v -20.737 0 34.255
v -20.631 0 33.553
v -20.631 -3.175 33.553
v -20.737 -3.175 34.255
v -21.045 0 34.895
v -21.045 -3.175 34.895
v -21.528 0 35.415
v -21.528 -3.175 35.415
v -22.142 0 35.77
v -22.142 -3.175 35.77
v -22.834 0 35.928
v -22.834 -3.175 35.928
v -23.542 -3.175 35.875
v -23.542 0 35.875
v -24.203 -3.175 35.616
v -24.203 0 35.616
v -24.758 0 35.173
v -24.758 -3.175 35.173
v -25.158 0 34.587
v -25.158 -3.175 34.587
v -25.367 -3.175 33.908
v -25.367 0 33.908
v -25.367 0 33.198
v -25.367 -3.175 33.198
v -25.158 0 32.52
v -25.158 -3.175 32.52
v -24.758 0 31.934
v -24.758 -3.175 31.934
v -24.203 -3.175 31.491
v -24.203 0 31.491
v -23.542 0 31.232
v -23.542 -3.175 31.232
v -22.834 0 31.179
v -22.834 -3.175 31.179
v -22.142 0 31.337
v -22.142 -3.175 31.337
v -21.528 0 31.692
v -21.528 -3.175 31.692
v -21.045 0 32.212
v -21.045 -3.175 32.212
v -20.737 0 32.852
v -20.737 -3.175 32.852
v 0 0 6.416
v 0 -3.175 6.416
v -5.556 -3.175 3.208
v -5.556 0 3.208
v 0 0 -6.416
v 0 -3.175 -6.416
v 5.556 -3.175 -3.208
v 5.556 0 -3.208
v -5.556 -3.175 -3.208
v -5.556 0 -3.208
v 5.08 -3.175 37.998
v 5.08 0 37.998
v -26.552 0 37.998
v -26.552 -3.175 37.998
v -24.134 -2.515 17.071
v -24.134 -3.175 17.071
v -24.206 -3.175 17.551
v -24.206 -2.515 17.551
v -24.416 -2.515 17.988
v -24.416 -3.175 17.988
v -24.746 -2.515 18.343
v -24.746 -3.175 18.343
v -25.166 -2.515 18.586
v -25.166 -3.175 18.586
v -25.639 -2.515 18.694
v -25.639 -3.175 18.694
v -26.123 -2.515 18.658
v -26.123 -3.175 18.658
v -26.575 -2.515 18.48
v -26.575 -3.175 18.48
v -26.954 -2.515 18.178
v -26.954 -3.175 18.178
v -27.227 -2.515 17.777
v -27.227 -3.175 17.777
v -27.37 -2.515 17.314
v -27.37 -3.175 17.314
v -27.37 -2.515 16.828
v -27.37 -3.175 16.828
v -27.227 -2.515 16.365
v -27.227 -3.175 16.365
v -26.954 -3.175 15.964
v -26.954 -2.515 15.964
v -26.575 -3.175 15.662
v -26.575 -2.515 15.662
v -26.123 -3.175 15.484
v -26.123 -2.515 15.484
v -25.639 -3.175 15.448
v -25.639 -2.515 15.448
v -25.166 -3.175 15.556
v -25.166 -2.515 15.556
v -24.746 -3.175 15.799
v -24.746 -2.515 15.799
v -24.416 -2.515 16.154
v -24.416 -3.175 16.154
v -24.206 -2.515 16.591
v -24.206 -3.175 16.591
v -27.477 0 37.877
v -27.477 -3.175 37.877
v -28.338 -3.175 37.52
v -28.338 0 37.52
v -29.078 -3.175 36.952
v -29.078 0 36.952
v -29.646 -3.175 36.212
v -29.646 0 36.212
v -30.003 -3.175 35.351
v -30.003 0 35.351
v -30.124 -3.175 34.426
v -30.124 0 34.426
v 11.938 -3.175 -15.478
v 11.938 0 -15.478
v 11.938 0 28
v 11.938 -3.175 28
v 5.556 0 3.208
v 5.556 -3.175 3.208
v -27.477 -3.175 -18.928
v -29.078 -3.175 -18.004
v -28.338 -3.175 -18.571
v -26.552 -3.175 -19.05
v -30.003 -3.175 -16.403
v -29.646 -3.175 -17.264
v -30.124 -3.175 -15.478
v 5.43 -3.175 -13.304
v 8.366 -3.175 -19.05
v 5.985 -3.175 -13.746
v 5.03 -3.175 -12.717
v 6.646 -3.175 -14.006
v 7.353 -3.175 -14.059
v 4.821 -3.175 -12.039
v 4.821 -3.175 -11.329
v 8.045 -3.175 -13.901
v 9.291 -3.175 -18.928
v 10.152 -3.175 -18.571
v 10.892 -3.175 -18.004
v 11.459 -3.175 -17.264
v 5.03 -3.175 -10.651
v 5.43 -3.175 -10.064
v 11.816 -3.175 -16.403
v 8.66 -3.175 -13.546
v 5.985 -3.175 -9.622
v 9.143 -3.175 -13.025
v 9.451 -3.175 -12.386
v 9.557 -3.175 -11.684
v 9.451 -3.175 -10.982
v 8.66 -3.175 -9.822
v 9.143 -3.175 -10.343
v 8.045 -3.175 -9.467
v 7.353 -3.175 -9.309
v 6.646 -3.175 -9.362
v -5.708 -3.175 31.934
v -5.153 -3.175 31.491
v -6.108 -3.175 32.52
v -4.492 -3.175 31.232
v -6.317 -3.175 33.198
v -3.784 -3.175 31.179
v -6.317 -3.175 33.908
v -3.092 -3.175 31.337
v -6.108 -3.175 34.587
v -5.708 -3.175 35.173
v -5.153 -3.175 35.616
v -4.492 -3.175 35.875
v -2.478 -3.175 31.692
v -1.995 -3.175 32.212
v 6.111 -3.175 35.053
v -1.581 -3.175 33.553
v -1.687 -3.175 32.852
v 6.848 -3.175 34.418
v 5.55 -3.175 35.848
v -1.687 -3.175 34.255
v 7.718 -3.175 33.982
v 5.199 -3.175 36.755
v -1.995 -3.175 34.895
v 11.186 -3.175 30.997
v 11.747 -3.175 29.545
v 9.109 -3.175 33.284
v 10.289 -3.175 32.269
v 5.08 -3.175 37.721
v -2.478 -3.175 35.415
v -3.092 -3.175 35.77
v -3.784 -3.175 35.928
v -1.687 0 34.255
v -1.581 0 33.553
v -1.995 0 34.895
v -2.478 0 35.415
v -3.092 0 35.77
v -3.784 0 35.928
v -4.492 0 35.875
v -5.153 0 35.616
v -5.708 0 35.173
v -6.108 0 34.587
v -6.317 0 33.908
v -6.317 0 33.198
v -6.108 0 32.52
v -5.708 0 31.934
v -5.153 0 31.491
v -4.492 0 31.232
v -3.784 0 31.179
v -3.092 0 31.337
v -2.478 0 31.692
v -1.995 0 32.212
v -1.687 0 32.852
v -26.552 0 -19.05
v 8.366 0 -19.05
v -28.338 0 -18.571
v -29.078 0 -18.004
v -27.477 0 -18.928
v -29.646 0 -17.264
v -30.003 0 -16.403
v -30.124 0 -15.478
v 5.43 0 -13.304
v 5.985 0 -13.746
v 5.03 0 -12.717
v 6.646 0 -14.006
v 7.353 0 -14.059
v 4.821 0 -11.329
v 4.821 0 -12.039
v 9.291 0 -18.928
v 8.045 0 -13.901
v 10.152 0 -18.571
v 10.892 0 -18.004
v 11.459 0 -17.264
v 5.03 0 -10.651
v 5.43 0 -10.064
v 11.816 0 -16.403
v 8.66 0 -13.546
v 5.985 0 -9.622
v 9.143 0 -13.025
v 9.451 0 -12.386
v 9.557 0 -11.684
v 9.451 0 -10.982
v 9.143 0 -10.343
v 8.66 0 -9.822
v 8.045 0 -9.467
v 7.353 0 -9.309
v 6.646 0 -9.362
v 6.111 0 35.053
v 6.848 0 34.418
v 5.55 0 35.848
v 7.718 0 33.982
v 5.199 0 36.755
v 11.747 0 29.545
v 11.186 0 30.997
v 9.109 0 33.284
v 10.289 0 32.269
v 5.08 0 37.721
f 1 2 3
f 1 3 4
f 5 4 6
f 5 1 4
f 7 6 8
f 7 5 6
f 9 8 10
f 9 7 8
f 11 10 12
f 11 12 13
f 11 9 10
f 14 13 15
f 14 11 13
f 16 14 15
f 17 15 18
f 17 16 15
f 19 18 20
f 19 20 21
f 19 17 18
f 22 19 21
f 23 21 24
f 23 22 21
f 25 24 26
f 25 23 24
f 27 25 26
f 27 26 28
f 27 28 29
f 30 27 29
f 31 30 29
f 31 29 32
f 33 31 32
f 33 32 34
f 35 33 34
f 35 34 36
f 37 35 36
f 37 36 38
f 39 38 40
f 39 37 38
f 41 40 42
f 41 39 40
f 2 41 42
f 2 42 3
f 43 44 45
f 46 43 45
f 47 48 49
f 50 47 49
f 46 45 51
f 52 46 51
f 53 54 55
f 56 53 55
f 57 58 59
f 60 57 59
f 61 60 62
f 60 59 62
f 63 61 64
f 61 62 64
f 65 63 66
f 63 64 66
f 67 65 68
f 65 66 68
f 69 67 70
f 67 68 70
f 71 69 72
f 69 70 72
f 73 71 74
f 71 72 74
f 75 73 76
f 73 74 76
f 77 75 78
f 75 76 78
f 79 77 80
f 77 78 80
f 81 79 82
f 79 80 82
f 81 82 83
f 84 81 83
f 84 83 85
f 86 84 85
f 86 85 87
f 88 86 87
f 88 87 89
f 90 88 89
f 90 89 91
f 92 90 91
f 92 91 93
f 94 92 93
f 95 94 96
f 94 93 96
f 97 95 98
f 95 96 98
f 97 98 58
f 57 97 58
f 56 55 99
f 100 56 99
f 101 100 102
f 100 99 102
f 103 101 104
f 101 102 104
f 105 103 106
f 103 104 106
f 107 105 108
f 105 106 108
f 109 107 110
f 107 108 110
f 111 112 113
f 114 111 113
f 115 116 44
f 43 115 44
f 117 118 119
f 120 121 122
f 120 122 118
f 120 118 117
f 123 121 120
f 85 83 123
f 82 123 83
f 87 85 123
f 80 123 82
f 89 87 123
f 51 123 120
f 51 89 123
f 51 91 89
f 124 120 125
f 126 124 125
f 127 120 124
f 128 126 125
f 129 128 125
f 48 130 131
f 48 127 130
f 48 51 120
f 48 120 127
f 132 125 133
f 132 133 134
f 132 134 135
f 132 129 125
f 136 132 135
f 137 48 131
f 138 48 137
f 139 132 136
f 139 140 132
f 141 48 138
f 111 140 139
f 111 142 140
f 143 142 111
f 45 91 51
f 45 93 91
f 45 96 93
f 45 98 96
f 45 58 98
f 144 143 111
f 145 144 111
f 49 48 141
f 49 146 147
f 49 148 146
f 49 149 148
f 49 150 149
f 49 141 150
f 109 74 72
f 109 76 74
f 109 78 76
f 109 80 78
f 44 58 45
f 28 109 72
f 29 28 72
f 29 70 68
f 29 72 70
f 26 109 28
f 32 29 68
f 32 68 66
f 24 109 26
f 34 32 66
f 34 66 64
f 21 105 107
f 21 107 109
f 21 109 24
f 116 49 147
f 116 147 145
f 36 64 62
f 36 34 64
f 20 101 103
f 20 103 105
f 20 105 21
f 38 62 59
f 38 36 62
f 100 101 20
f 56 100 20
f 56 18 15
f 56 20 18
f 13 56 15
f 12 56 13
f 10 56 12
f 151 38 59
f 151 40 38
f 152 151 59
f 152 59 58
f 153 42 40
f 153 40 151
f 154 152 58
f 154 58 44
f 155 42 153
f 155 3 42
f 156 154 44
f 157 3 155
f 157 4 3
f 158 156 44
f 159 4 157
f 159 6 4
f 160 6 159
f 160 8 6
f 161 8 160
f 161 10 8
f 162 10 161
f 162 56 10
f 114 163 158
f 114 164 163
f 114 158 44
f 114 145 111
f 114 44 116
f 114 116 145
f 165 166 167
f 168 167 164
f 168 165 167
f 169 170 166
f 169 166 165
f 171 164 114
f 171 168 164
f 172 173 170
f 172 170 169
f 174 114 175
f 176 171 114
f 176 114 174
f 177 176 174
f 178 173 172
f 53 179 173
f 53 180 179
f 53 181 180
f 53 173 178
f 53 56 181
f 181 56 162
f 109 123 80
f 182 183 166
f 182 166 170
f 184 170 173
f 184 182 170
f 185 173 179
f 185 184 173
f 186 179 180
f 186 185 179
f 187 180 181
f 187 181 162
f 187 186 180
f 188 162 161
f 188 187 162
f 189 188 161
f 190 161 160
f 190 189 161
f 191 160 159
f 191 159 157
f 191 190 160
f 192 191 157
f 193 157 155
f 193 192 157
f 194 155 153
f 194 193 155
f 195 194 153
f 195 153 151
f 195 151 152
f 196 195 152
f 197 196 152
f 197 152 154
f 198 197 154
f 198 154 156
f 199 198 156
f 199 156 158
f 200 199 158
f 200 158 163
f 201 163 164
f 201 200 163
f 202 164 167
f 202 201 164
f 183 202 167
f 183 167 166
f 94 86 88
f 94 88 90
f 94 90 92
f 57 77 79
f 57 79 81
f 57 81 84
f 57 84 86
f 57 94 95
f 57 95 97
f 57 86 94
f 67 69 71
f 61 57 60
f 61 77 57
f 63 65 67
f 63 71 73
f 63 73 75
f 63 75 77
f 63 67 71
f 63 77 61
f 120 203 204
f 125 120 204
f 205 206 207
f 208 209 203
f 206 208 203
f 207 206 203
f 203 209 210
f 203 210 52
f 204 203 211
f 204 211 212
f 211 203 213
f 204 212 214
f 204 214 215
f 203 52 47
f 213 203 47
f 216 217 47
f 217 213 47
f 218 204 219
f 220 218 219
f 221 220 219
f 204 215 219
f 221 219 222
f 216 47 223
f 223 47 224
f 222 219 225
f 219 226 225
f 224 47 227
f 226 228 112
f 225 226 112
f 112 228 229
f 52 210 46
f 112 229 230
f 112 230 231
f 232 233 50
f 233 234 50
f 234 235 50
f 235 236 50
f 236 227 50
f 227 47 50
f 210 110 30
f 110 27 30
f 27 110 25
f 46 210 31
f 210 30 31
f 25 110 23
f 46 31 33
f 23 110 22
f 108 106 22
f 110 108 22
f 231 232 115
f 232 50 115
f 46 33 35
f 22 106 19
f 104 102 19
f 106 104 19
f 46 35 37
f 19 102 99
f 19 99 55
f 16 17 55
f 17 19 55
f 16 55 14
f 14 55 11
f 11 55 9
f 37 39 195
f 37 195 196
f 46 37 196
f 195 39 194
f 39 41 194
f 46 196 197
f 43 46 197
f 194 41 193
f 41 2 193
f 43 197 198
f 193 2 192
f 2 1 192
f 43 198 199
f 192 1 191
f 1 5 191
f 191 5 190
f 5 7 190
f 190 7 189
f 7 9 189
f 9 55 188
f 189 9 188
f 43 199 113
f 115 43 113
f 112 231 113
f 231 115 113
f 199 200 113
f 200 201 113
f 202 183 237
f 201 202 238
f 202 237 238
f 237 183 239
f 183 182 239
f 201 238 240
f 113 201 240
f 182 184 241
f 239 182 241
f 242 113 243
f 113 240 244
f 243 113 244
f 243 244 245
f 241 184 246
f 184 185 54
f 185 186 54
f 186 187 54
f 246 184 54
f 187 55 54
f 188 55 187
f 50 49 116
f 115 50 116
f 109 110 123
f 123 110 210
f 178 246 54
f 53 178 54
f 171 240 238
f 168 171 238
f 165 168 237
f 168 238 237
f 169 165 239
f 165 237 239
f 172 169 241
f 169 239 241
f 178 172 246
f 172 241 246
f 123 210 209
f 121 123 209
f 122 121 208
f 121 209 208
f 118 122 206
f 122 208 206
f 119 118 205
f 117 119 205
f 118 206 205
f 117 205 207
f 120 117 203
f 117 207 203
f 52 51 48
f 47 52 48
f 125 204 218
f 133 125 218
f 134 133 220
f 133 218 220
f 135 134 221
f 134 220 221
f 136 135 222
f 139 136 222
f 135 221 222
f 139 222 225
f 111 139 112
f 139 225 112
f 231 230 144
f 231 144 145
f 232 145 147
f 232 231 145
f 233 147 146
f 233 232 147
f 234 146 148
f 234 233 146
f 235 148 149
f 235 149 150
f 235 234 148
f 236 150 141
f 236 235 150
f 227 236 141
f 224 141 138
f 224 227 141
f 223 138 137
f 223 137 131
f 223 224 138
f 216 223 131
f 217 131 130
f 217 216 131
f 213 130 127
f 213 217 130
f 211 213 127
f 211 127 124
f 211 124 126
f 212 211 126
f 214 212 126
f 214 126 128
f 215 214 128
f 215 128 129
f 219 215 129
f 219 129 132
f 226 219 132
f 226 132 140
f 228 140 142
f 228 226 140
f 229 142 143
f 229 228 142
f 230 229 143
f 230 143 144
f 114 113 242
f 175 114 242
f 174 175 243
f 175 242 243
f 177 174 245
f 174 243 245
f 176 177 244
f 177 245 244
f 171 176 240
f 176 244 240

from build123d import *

# Parameters (mm, degrees)
F0_R     = 2.38125
F0_R_2   = 3.175
F1_DEPTH = 3.175
F3_DEPTH = 3.176
F4_R     = 1.627418
F5_DEPTH = 0.6604


with BuildPart() as f1:
    # F0 (on Front) → F1 (new body)
    with BuildSketch(Plane.XZ):
        with BuildLine():
            ThreePointArc((-30.1244, -15.477998), (-29.078185, -18.003785), (-26.552398, -19.05))
            Line((-26.552398, -19.05), (8.365998, -19.05))
            ThreePointArc((8.365998, -19.05), (10.891785, -18.003785), (11.938, -15.477998))
            Line((11.938, -15.477998), (11.938, 27.999858))
            ThreePointArc((11.938, 27.999858), (10.77674, 31.660388), (7.717692, 33.982074))
            ThreePointArc((7.717692, 33.982074), (5.805787, 35.433129), (5.08, 37.72096))
            Line((5.08, 37.72096), (5.08, 37.9984))
            Line((5.08, 37.9984), (-26.552398, 37.9984))
            ThreePointArc((-26.552398, 37.9984), (-29.078185, 36.952185), (-30.1244, 34.426398))
            Line((-30.1244, 34.426398), (-30.1244, -15.477998))
        make_face()
        with Locations((7.1755, -11.684)):
            Circle(F0_R, mode=Mode.SUBTRACT)
        Circle(F0_R_2, mode=Mode.SUBTRACT)
        with Locations((-23.0124, 33.5534)):
            Circle(F0_R, mode=Mode.SUBTRACT)
        with Locations((-3.9624, 33.5534)):
            Circle(F0_R, mode=Mode.SUBTRACT)
    extrude(amount=F1_DEPTH)

    # F2 (on face) → F3 (cut, through all)
    with BuildSketch(Plane.XZ.offset(3.175)):
        Polygon((0, 6.415805), (-5.55625, 3.207902), (-5.55625, -3.207902), (0, -6.415805), (5.55625, -3.207902), (5.55625, 3.207902), align=None)
    extrude(amount=-F3_DEPTH, mode=Mode.SUBTRACT)

    # F4 (on face) → F5 (cut)
    with BuildSketch(Plane.XZ.offset(3.175)):
        with Locations((-25.760997, 17.07097)):
            Circle(F4_R)
    extrude(amount=-F5_DEPTH, mode=Mode.SUBTRACT)


solid = f1.part
